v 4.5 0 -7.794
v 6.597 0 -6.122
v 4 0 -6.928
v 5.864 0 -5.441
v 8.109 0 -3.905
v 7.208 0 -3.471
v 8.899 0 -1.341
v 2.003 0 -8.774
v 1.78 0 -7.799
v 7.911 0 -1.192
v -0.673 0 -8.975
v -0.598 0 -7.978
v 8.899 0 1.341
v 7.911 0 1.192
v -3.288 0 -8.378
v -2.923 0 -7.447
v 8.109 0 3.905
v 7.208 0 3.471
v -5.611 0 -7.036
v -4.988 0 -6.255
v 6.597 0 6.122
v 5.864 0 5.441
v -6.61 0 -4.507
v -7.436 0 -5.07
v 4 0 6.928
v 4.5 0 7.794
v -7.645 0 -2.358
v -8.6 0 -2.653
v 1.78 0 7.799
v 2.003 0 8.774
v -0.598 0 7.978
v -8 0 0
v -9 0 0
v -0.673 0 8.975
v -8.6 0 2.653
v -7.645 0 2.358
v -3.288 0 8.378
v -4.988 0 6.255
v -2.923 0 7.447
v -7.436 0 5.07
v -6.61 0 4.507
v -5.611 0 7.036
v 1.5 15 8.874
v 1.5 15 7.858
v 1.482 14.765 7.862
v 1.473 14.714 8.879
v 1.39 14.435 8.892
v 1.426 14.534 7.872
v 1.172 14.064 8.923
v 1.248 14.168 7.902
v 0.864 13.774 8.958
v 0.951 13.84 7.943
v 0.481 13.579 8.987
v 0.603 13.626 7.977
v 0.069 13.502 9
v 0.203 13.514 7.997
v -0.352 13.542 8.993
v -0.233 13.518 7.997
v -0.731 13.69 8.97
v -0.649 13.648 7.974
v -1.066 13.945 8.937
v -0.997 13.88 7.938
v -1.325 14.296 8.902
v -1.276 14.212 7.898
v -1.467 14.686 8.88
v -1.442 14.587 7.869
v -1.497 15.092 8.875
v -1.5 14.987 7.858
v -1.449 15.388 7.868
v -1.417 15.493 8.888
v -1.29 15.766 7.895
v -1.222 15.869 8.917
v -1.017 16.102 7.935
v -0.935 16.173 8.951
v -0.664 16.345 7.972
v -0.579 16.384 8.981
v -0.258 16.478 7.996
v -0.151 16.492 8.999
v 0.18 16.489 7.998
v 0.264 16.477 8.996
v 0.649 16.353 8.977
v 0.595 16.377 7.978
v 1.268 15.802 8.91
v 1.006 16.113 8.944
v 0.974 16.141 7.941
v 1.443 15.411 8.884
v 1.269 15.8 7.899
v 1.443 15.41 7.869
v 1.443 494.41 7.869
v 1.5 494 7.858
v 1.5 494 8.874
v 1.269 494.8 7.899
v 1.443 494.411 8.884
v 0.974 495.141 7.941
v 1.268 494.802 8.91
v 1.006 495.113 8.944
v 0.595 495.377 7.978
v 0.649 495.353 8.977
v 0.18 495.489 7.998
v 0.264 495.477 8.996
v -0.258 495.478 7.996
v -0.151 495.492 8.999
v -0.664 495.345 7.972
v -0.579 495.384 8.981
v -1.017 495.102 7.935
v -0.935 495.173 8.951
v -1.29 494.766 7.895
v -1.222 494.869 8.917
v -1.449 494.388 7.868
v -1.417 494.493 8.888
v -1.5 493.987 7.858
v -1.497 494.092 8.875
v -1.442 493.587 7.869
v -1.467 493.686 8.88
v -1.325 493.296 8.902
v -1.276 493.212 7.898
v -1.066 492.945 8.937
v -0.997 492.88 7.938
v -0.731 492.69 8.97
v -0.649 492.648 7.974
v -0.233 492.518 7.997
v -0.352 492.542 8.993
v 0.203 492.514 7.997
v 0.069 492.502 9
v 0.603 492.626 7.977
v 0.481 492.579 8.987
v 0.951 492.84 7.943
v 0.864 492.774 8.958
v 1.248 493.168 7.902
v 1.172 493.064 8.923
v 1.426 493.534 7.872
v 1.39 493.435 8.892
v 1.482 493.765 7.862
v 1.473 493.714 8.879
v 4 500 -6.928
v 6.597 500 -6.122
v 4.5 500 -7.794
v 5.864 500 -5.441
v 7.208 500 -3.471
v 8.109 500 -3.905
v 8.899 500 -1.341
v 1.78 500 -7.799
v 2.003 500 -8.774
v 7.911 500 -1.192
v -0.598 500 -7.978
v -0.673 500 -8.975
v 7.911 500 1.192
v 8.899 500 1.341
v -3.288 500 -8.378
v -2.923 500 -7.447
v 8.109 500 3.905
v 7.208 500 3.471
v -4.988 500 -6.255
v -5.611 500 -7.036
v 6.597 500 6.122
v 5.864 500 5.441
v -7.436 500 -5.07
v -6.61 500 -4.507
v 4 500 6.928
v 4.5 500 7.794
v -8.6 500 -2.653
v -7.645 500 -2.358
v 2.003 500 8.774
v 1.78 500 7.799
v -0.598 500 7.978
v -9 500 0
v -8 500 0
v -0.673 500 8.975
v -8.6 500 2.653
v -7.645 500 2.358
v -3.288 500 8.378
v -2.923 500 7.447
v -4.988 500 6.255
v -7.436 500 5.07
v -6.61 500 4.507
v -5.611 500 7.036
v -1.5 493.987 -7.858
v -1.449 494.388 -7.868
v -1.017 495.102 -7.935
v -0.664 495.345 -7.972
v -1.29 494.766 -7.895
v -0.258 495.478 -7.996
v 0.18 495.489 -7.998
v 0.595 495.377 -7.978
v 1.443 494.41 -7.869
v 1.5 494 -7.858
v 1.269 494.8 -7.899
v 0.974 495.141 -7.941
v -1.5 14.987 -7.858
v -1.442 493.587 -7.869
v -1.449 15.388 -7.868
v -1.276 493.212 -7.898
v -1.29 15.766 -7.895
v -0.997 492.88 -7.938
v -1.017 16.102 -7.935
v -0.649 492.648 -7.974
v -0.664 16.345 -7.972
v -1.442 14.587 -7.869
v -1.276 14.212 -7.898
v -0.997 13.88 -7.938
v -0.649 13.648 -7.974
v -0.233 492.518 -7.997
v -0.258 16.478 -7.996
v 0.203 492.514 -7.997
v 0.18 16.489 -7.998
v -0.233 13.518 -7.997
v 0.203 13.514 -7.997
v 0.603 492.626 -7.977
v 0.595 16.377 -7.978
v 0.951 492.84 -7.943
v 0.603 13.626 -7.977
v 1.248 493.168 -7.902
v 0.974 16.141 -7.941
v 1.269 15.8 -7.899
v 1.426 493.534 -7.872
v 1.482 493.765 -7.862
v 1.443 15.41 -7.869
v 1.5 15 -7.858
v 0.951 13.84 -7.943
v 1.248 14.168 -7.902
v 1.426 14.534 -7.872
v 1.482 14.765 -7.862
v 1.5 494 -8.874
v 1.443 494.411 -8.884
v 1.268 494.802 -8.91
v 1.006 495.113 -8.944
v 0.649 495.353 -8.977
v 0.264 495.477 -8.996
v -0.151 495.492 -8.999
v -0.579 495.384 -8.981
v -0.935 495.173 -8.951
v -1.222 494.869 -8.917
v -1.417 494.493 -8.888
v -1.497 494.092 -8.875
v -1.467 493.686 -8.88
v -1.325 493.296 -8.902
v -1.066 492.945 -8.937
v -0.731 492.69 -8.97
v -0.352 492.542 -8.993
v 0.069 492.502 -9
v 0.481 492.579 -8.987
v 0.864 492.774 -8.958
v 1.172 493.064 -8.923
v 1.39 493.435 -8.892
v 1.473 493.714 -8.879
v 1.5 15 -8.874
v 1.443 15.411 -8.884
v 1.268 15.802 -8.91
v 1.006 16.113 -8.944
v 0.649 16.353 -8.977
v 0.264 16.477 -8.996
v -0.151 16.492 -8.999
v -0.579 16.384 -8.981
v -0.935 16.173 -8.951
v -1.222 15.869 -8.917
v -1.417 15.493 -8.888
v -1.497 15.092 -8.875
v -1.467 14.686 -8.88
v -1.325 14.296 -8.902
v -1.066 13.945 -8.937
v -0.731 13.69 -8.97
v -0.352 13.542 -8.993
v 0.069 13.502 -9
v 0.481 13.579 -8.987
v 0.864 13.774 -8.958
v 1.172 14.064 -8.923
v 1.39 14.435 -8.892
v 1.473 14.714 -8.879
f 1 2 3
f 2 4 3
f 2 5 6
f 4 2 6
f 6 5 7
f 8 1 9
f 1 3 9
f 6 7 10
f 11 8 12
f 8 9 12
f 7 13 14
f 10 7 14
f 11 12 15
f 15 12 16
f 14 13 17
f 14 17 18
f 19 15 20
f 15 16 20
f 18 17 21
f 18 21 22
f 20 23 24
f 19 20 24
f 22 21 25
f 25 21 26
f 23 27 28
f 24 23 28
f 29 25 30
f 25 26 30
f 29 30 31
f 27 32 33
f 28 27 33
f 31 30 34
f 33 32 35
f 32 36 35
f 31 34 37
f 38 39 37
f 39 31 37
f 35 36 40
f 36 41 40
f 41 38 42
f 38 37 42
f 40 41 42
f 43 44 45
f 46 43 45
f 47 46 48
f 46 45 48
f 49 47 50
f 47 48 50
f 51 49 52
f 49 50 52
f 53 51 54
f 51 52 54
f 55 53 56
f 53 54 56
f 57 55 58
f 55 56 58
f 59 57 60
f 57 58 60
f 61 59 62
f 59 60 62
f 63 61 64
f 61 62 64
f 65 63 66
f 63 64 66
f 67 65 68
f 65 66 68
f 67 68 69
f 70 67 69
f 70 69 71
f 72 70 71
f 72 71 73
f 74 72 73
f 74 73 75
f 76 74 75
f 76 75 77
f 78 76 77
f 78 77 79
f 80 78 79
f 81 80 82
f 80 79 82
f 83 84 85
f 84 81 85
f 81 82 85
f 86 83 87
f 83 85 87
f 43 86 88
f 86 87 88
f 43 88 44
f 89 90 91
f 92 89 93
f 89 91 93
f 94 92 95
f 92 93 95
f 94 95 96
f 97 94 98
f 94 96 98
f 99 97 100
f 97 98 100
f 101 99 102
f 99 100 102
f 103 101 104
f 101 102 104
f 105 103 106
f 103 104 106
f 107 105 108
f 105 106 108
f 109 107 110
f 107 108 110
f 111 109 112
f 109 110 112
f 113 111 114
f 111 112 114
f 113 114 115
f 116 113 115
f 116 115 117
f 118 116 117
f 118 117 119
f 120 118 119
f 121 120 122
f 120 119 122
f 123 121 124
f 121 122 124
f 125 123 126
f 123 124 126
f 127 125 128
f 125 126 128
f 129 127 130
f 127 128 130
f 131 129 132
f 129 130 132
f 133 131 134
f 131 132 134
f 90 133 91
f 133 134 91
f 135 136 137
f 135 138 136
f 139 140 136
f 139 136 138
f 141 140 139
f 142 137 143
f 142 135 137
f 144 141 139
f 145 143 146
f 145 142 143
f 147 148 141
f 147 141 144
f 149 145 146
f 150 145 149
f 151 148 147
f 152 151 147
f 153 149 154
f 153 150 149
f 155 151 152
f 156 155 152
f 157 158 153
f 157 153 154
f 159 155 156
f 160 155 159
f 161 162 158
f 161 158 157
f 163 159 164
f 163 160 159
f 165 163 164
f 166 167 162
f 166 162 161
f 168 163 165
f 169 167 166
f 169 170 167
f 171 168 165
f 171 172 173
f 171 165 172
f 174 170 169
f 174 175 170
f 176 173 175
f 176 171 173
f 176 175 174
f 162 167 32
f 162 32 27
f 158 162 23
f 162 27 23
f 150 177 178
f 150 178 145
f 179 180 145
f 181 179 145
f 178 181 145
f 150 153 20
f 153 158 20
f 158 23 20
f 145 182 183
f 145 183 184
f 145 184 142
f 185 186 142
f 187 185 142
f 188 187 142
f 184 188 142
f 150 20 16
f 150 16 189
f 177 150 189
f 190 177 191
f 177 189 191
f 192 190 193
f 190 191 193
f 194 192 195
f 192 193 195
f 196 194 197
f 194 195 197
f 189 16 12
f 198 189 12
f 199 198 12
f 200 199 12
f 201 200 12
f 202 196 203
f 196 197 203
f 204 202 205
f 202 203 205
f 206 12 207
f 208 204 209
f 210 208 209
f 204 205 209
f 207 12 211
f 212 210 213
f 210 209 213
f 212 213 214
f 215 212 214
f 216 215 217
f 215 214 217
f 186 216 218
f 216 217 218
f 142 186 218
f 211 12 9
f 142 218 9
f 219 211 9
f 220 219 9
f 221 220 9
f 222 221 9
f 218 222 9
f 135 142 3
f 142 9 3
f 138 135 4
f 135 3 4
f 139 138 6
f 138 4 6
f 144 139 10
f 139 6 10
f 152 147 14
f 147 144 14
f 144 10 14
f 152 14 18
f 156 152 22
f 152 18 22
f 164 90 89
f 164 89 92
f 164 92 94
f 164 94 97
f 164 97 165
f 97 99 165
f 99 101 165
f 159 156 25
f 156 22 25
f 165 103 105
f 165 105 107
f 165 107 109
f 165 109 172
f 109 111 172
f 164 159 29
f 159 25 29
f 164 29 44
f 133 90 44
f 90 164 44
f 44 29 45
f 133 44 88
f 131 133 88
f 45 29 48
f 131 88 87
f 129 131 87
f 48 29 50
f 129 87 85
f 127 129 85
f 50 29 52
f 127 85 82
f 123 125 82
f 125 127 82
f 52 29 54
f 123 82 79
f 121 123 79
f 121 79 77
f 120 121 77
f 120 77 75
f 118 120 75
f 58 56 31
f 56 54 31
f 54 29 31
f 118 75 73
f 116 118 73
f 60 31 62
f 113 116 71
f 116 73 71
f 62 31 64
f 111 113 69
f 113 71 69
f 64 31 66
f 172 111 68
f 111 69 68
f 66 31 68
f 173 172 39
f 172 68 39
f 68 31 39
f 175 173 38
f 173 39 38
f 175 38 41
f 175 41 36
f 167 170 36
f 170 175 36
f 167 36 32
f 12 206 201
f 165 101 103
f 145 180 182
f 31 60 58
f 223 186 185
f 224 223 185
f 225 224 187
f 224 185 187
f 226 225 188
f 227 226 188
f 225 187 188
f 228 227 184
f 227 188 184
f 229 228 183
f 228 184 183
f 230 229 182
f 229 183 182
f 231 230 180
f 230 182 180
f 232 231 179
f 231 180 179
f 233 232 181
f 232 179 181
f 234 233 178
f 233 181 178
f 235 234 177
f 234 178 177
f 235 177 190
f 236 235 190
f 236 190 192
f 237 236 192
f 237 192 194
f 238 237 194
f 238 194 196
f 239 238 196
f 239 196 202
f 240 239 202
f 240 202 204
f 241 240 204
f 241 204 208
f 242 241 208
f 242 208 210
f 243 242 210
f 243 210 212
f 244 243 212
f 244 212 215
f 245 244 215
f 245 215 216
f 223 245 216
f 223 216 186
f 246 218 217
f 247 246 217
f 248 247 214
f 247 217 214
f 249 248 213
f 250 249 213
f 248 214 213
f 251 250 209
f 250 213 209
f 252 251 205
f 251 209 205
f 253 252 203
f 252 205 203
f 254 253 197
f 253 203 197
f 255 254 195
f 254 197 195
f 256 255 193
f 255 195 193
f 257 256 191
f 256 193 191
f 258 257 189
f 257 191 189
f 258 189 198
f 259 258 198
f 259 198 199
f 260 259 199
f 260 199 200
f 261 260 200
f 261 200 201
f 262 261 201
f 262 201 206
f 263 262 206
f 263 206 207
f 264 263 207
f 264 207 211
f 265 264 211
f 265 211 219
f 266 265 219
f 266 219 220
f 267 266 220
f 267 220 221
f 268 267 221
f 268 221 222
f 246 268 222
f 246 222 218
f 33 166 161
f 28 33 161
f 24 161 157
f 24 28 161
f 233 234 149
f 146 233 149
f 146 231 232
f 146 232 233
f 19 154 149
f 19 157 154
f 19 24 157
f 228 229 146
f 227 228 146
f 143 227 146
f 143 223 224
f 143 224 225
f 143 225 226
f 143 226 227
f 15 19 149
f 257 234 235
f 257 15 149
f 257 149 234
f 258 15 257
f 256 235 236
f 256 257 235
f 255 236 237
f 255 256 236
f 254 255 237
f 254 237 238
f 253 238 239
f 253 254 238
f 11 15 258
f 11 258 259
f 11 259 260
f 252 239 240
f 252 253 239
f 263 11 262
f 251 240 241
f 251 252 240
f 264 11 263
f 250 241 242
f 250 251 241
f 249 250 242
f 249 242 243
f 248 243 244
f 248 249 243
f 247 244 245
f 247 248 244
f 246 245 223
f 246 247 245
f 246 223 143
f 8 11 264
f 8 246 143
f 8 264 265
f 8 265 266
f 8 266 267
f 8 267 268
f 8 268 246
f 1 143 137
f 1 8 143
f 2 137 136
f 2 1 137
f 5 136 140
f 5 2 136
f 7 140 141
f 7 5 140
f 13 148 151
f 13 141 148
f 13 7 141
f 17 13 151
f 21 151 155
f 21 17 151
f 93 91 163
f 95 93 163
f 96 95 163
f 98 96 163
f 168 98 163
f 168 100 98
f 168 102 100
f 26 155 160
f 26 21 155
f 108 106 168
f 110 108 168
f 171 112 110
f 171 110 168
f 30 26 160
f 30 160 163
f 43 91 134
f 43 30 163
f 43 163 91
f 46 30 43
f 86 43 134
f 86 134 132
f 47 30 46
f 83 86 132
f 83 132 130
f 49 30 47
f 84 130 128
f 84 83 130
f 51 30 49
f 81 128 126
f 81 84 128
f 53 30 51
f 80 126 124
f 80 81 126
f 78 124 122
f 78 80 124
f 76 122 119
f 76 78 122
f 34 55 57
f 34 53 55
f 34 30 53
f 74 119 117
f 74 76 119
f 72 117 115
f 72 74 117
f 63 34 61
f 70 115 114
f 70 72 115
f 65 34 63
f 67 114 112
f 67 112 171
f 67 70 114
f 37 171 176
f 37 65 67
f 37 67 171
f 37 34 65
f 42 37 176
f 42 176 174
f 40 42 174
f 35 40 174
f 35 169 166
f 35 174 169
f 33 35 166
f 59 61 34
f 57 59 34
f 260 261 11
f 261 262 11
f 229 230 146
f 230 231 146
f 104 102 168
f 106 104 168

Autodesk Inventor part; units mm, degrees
ref_plane "YZ Plane" through (0, 0, 0) normal (1, 0, 0) x (0, 1, 0)
ref_plane "XZ Plane" through (0, 0, 0) normal (0, 1, 0) x (-1, 0, 0)
ref_plane "XY Plane" through (0, 0, 0) normal (0, 0, 1) x (1, 0, 0)
sketch "Sketch2" plane through (0, 0, 0) normal (0, 1, 0) x (-1, 0, 0)
  circle A0 centre (0, 0) radius 9
  circle A1 centre (0, 0) radius 8
  dimension "d91" = 18
  dimension "d92" = 16
extrude "Extrusion5" add sketch "Sketch2" along normal blind 500
sketch "Sketch3" plane through (0, 0, 0) normal (0, 0, 1) x (1, 0, 0)
  line L0 (0, 0) -> (0, 15) construction
  circle A0 centre (0, 15) radius 1.5
  line L1 (9, 500) -> (-9, 500) projected
  line L2 (0, 500) -> (0, 494)
  circle A1 centre (0, 494) radius 1.5
  dimension "d95" = 15
  dimension "d96" = 3
  dimension "d97" = 6
  dimension "d98" = 3
extrude "Extrusion6" cut sketch "Sketch3" along normal blind 10 and the other way blind 10
properties part number "airfoil"
